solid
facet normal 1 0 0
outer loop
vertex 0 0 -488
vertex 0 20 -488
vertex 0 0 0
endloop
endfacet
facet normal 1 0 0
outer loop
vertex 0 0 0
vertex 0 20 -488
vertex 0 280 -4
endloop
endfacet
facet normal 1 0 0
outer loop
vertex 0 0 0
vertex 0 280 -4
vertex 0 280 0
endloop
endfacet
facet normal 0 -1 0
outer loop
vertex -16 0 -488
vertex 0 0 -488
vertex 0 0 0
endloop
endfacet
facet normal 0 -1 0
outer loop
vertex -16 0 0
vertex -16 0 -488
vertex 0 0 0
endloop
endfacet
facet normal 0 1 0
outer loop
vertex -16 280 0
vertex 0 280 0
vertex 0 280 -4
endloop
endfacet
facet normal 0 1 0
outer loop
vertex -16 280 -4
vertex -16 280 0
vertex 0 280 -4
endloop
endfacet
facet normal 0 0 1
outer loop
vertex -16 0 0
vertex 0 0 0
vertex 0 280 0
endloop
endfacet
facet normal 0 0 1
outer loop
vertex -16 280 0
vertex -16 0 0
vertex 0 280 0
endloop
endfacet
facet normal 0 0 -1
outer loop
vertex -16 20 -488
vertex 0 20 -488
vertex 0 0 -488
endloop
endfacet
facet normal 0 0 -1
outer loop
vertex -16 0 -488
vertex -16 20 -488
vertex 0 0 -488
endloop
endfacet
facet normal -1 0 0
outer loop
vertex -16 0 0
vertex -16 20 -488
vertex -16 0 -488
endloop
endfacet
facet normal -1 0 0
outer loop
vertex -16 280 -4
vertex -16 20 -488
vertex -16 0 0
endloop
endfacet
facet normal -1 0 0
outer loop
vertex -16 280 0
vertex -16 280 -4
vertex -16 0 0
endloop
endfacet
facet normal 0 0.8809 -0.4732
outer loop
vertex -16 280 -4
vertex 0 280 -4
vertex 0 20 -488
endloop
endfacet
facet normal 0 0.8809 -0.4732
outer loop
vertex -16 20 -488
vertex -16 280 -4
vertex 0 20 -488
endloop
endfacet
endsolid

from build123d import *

# Parameters (mm, degrees)
SM_BASE_FLANGE_1_DEPTH = 16


# Sheet-metal steps are written as plain solids
with BuildPart() as part:
    # Sketch 1 → 基体-法兰1 (new body)
    with BuildSketch(Plane(origin=(0, 0, 0), x_dir=(0, 0, -1), z_dir=(1, 0, 0))):
        Polygon((0, 0), (0, 280), (4, 280), (488, 20), (488, 0), align=None)
    extrude(amount=-SM_BASE_FLANGE_1_DEPTH)


solid = part.part
